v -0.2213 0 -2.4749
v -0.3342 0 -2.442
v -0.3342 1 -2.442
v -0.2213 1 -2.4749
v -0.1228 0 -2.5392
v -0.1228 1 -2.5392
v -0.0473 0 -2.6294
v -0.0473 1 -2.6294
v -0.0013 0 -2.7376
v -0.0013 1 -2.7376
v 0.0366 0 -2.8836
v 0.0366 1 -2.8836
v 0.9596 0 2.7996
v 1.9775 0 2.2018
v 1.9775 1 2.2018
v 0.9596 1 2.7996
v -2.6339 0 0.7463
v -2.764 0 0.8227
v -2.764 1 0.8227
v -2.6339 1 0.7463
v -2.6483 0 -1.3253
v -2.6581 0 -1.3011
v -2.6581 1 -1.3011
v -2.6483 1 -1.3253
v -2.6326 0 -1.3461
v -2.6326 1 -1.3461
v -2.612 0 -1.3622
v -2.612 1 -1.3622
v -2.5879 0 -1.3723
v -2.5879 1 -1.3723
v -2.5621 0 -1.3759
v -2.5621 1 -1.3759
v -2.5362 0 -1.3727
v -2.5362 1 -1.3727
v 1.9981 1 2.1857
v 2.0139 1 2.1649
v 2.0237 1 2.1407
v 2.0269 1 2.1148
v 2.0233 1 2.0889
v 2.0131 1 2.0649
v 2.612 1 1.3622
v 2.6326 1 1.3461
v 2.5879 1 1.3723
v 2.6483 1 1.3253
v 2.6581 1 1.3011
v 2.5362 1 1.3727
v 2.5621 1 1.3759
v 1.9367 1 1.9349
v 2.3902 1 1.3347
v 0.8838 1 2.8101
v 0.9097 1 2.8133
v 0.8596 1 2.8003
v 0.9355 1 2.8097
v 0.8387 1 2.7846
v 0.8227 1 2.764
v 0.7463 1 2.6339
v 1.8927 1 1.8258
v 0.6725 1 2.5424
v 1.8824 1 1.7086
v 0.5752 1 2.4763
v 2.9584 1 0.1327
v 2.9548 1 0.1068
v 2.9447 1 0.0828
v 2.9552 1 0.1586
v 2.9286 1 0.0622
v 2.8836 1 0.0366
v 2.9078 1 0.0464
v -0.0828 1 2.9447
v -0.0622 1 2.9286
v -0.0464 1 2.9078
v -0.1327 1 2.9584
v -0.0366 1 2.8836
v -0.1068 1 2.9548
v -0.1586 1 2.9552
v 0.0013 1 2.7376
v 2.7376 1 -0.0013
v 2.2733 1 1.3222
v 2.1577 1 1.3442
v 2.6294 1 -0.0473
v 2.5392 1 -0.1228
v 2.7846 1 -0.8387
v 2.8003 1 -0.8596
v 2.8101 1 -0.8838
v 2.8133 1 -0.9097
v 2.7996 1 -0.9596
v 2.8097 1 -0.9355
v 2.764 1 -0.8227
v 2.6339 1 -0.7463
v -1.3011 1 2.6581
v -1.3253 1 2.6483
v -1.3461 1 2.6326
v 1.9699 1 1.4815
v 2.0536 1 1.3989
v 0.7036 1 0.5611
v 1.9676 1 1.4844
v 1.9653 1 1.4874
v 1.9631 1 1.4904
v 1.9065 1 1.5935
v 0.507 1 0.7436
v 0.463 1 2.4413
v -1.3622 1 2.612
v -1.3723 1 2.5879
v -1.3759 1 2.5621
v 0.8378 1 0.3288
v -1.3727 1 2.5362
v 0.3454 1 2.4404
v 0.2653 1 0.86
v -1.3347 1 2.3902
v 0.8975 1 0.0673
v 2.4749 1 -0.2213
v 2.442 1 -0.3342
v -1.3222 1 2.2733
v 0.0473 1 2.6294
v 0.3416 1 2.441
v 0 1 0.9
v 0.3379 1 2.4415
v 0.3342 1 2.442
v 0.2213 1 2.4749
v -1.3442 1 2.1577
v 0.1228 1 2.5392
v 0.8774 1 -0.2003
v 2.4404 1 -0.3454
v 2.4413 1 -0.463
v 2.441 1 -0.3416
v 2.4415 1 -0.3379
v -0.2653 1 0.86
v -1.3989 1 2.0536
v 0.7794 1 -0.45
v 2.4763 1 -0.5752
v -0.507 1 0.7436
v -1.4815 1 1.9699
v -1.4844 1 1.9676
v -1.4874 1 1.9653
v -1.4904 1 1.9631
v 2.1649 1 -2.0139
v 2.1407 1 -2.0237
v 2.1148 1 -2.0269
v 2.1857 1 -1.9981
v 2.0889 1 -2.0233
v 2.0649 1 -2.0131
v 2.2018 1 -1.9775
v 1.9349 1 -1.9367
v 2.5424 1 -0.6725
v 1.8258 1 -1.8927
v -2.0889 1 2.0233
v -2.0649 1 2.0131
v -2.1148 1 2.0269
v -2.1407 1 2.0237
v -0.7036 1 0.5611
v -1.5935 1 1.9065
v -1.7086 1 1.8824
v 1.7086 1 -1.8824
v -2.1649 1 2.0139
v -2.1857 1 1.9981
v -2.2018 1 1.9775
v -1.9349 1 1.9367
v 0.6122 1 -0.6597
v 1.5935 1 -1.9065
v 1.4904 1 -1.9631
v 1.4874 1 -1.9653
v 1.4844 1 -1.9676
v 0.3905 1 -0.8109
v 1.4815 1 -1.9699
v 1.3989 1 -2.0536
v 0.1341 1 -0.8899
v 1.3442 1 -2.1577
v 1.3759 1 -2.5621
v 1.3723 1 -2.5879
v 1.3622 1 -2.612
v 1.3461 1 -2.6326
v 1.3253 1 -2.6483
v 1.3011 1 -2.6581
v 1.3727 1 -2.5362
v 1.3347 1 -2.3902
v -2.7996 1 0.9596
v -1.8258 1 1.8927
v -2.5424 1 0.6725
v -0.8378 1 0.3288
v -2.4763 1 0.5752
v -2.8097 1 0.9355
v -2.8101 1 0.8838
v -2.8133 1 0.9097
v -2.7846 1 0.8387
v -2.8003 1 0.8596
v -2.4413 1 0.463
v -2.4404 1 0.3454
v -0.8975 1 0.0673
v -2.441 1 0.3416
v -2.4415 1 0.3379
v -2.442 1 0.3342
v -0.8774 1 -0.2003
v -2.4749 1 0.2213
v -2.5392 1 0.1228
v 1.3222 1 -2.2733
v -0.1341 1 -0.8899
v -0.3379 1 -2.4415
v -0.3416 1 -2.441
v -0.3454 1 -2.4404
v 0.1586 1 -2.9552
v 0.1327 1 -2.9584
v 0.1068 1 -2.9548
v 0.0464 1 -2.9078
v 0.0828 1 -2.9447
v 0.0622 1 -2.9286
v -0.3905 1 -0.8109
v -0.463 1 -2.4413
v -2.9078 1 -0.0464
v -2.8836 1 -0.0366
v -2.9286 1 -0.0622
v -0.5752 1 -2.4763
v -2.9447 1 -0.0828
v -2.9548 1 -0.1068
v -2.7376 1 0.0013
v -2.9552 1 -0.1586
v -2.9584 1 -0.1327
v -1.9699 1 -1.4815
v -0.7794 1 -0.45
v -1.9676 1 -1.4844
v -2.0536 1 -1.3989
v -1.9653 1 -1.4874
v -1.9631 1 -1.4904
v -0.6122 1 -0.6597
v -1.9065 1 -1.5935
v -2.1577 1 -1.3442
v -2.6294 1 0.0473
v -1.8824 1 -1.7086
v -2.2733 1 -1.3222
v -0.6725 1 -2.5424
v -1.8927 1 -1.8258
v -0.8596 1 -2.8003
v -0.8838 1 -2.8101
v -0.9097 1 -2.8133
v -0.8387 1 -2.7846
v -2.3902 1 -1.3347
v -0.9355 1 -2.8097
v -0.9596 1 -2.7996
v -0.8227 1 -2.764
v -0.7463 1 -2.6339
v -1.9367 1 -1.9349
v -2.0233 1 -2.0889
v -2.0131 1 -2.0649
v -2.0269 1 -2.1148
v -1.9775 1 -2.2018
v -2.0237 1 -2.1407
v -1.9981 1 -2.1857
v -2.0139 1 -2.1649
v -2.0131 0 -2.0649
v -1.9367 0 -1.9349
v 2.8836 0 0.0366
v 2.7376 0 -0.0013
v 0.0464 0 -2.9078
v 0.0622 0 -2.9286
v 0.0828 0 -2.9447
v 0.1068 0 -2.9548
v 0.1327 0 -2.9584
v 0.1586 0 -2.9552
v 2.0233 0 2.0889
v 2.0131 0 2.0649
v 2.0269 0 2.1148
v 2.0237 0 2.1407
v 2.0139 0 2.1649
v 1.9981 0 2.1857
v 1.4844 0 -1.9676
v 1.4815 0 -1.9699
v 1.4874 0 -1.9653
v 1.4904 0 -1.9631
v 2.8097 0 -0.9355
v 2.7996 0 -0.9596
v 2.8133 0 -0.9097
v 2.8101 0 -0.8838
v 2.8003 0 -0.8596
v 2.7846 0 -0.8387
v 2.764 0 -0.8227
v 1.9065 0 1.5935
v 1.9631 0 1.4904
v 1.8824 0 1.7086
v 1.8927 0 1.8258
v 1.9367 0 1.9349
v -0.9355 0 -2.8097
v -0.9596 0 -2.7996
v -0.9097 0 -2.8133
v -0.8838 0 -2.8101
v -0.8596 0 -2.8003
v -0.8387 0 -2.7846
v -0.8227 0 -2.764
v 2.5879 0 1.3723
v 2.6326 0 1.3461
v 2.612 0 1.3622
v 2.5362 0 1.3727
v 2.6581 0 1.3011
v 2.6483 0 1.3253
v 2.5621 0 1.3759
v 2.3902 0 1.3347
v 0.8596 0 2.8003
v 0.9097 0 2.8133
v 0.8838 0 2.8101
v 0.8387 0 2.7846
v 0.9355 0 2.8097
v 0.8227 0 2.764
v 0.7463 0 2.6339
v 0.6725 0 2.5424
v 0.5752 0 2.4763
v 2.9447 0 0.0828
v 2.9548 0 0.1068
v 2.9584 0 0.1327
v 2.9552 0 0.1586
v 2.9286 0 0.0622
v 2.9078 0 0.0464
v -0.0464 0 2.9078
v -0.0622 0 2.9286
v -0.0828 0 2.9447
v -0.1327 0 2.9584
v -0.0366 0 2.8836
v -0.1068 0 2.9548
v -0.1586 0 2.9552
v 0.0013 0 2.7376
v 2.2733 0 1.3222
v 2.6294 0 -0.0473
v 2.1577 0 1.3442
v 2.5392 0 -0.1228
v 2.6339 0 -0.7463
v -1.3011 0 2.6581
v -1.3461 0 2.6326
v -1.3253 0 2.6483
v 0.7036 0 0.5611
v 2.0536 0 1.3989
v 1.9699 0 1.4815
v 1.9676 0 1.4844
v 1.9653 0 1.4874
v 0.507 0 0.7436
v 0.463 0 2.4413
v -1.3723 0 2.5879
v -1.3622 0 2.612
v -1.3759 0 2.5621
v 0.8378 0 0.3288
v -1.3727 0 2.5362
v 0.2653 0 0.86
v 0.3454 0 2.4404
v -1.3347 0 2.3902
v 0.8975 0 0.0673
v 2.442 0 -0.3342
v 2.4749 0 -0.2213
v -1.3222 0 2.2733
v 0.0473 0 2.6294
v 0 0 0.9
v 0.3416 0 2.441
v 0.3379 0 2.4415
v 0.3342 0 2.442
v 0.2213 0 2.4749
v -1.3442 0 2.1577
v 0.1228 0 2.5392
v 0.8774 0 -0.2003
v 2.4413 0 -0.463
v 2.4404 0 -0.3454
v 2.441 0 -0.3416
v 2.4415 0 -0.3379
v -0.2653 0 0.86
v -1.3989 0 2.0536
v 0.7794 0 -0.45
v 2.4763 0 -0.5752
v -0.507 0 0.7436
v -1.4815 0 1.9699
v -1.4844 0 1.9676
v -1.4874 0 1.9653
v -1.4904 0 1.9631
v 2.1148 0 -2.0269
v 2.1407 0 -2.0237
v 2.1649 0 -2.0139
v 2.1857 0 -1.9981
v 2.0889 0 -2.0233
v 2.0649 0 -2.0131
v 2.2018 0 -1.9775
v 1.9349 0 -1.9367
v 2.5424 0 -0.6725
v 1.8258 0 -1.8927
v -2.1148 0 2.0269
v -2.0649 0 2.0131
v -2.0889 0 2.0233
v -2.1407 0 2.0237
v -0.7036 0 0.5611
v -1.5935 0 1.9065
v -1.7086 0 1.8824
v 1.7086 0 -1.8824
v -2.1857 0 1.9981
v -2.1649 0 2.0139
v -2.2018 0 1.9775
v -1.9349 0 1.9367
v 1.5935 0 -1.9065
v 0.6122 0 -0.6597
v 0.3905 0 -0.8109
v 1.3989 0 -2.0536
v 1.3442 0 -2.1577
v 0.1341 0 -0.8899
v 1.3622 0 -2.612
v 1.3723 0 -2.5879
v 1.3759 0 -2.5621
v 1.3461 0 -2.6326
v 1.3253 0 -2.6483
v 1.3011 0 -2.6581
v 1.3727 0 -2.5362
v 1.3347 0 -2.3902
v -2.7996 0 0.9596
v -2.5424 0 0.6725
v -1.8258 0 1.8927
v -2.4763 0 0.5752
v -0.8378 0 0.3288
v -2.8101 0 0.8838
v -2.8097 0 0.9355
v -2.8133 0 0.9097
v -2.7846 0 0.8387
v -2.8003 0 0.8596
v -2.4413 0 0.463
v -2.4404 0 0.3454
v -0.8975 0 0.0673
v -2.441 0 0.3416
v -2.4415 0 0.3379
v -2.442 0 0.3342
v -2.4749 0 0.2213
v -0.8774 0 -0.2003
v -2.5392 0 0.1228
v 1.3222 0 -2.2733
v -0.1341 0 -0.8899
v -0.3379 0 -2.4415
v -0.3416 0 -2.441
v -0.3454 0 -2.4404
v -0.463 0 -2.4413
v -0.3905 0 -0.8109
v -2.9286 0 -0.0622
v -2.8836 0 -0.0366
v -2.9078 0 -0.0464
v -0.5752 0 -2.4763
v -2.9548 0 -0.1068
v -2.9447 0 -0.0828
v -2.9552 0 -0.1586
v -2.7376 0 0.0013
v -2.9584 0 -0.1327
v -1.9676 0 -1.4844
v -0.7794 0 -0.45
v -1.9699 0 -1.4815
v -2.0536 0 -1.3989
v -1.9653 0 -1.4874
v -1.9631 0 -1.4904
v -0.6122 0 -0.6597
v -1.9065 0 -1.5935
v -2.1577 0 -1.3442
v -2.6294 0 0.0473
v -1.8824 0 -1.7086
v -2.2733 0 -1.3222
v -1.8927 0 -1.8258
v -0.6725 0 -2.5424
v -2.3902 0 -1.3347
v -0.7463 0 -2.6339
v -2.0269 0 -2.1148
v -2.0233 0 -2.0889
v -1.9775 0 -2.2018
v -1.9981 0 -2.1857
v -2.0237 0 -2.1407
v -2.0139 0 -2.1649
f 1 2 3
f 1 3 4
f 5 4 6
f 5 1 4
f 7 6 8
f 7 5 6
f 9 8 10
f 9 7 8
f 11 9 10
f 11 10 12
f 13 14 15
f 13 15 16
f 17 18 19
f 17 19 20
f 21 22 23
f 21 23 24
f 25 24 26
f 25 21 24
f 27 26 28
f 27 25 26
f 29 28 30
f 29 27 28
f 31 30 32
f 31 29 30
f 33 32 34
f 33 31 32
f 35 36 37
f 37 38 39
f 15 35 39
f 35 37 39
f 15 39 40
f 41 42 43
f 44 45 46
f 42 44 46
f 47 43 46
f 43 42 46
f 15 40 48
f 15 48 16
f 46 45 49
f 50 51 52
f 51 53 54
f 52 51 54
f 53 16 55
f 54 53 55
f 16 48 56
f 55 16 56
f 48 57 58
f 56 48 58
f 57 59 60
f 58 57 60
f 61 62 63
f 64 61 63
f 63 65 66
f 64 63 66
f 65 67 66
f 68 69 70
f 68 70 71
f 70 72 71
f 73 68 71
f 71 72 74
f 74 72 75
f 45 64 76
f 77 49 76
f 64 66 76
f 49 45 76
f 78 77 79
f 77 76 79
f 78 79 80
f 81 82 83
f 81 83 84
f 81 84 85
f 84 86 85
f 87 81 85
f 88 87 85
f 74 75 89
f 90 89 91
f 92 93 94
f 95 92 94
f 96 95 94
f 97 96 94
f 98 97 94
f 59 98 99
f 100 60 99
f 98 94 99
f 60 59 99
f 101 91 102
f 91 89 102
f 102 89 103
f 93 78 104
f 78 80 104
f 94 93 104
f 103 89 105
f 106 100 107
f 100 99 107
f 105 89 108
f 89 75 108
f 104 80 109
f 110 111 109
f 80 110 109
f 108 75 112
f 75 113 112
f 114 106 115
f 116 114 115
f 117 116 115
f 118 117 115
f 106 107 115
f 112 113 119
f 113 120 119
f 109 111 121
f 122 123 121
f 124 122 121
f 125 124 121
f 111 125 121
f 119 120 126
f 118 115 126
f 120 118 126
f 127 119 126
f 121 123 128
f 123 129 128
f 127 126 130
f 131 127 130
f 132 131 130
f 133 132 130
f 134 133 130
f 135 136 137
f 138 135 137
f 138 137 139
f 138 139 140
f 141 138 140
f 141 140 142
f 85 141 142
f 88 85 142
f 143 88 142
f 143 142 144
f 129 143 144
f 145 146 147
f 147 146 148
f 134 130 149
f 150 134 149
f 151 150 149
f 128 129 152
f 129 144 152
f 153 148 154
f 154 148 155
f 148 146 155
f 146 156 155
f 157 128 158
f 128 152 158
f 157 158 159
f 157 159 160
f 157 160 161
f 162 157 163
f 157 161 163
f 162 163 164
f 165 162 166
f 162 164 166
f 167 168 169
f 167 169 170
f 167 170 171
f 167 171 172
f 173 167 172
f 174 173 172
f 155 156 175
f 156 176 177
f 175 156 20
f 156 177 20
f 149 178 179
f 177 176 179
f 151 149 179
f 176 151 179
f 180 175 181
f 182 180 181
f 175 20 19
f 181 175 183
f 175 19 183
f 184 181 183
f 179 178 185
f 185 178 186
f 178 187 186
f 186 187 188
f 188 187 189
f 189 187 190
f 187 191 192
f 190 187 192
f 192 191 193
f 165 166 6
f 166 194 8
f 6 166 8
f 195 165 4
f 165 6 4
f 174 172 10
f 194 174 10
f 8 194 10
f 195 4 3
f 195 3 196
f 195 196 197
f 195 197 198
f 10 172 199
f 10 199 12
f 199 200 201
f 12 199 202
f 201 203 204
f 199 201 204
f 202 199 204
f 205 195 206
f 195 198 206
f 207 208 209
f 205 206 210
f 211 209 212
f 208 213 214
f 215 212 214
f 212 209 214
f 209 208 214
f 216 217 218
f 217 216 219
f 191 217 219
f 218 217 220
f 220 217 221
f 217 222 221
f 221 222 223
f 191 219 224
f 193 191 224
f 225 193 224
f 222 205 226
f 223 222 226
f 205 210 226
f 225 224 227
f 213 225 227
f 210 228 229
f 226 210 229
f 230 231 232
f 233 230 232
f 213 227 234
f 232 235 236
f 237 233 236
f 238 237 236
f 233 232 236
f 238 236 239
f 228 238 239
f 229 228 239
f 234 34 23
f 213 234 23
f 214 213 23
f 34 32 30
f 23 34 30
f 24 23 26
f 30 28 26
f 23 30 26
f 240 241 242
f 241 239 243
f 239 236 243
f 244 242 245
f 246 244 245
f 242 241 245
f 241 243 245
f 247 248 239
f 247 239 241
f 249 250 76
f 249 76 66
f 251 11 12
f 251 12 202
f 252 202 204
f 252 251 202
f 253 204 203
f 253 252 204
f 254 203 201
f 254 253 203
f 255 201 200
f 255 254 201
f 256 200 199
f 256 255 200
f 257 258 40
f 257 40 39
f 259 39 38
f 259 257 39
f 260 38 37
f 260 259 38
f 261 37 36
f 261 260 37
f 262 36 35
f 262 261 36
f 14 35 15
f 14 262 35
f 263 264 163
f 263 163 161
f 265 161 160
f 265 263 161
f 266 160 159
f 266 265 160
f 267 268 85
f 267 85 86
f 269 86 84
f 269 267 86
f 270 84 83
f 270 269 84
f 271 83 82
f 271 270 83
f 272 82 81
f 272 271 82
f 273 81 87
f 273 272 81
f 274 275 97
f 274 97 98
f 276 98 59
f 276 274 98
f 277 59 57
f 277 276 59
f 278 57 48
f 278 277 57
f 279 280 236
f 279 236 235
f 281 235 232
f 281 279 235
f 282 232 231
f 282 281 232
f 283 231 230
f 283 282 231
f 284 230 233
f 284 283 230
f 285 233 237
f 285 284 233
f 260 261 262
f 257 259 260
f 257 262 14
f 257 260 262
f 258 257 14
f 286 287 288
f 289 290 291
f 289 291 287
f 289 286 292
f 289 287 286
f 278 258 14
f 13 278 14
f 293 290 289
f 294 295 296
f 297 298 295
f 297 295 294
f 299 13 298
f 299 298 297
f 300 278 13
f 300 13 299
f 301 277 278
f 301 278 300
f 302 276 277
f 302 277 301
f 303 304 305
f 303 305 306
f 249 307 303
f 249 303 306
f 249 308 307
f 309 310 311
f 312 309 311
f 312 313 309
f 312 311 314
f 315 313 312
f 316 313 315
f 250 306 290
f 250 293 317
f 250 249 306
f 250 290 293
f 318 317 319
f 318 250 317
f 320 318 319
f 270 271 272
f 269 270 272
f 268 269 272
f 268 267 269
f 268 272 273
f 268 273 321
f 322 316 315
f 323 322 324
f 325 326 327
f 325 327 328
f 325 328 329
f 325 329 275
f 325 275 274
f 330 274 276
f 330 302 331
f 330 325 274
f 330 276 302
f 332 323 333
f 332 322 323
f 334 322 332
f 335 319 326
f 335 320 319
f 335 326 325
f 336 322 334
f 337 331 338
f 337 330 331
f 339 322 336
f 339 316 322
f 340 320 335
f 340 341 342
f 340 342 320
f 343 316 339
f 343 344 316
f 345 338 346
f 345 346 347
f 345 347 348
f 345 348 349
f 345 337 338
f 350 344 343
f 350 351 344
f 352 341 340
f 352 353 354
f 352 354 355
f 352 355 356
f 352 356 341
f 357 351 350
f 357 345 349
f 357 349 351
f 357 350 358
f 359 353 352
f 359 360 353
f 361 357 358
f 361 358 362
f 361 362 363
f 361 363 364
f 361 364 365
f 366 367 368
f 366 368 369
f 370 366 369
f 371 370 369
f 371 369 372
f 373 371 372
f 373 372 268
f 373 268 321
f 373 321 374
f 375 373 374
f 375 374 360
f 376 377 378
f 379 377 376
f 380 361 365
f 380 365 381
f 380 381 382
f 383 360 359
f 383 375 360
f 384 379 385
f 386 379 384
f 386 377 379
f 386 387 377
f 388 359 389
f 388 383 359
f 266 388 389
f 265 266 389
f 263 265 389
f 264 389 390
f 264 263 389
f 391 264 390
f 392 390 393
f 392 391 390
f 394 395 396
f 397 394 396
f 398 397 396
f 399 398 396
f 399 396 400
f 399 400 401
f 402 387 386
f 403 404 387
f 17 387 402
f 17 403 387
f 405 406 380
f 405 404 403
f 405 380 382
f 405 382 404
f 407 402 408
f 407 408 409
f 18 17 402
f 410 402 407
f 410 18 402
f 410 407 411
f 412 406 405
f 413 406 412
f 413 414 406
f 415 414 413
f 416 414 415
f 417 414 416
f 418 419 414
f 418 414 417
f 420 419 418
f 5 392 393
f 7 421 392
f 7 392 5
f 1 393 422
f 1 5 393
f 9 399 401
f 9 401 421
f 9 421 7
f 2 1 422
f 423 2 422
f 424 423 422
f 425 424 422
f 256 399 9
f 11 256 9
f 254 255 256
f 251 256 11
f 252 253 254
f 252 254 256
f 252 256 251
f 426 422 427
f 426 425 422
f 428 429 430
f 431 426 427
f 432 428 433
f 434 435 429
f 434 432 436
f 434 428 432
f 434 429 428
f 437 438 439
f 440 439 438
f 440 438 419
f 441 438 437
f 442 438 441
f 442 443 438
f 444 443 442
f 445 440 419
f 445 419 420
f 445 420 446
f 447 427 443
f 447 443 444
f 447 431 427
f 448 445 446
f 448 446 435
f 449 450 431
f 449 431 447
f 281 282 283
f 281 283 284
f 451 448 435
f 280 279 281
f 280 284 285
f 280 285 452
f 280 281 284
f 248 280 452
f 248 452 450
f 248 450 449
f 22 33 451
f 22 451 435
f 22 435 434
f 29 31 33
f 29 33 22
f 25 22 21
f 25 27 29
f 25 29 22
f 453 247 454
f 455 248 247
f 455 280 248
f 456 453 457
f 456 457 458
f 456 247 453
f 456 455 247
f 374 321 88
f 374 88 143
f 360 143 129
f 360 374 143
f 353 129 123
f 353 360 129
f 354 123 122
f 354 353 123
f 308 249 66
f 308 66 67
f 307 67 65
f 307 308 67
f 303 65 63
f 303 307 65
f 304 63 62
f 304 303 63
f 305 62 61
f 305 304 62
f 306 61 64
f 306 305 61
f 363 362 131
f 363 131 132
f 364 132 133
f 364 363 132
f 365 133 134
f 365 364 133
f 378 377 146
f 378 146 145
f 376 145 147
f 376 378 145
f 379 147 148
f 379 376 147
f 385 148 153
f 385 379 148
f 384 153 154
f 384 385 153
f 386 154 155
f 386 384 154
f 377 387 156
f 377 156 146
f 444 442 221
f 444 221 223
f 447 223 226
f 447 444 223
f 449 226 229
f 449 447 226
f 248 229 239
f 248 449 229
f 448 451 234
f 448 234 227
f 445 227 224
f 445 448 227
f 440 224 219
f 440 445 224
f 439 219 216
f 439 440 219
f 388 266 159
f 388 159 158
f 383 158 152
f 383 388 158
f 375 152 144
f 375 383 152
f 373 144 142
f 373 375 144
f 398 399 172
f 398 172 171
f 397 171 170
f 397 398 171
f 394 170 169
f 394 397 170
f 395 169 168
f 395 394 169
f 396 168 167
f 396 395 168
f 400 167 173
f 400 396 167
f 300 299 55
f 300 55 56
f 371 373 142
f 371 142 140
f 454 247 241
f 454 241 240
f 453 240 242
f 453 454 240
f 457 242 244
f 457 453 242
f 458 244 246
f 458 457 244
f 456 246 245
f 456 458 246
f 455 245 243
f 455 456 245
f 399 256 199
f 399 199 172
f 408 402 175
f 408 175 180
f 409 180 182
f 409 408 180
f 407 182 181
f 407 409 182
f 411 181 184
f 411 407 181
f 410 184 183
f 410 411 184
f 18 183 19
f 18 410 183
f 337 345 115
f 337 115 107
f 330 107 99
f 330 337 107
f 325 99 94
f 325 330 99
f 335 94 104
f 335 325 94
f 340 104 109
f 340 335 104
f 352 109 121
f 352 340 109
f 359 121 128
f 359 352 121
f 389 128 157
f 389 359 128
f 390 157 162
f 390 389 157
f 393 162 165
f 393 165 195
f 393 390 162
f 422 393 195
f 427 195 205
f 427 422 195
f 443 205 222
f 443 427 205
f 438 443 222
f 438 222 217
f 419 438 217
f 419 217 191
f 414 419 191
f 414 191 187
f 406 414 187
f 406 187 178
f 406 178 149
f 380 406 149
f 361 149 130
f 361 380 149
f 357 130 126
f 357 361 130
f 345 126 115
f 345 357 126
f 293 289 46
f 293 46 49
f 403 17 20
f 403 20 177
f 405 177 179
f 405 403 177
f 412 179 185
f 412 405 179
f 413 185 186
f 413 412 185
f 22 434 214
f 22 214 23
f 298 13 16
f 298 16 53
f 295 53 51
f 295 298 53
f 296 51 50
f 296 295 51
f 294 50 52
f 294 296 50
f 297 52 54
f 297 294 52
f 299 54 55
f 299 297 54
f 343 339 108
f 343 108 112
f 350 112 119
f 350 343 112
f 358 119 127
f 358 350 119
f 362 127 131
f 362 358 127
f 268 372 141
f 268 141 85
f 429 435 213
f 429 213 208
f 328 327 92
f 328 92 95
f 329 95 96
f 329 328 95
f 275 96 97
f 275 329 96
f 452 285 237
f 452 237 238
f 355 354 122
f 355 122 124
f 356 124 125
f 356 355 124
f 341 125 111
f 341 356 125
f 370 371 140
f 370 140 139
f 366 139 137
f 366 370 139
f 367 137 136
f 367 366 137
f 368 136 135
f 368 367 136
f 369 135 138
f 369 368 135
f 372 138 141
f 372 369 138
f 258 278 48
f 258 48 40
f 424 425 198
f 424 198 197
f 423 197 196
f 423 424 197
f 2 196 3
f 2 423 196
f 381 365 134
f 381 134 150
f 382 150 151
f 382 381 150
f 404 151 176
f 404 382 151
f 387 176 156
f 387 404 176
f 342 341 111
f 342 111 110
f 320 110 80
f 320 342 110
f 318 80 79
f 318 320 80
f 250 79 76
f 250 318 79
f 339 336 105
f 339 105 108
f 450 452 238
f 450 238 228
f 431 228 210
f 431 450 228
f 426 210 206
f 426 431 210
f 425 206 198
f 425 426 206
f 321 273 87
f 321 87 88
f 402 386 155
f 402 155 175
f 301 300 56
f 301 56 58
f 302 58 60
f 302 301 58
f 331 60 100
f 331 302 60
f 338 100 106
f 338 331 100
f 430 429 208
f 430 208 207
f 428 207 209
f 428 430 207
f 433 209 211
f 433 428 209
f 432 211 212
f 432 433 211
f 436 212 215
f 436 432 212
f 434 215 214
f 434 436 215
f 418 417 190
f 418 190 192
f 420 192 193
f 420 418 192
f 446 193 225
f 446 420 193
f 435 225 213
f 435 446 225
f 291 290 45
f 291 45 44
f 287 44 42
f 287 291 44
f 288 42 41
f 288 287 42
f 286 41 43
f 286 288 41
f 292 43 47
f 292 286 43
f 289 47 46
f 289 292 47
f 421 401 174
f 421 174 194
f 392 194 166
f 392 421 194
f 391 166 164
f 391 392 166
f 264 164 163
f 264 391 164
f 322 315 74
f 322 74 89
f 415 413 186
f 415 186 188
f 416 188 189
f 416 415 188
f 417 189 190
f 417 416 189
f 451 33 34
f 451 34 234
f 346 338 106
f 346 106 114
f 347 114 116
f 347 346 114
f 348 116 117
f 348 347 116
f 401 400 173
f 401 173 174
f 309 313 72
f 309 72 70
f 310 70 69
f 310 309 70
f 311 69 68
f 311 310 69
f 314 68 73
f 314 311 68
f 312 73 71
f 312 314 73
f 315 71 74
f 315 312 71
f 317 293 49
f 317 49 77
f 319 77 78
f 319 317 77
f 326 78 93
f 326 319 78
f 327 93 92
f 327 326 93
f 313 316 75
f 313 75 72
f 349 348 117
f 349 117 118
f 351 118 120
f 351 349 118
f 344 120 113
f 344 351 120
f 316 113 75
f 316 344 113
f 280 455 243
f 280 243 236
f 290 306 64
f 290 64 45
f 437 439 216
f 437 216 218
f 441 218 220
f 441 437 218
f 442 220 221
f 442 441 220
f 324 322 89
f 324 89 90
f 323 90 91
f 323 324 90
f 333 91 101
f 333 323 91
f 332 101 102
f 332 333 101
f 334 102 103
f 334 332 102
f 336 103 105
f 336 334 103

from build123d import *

# Parameters (mm, degrees)
SKETCH_1_R      = 0.9
EXTRUDE_1_DEPTH = 1


with BuildPart() as part:
    # Эскиз1 → Бобышка-Вытянуть1 (new body)
    with BuildSketch(Plane(origin=(0, 0, 0), x_dir=(1, 0, 0), z_dir=(0, 1, 0))):
        with BuildLine():
            Line((-2.955209453, 0.158565738), (-2.658114772, 1.301088723))
            ThreePointArc((-2.658114772, 1.301088723), (-2.611972769, 1.36215246), (-2.536166863, 1.372703719))
            Line((-2.536166863, 1.372703719), (-2.390204654, 1.3347486))
            ThreePointArc((-2.390204654, 1.3347486), (-2.157733286, 1.344214113), (-1.969855467, 1.481452804))
            ThreePointArc((-1.969855467, 1.481452804), (-1.966473238, 1.485939425), (-1.96308079, 1.490418325))
            ThreePointArc((-1.96308079, 1.490418325), (-1.882365193, 1.708632727), (-1.936743933, 1.934852721))
            Line((-1.936743933, 1.934852721), (-2.013116479, 2.064901911))
            ThreePointArc((-2.013116479, 2.064901911), (-2.023667738, 2.140707816), (-1.977525735, 2.201771553))
            Line((-1.977525735, 2.201771553), (-0.959562321, 2.799579639))
            ThreePointArc((-0.959562321, 2.799579639), (-0.883756416, 2.810130898), (-0.822692679, 2.763988896))
            Line((-0.822692679, 2.763988896), (-0.746320133, 2.633939706))
            ThreePointArc((-0.746320133, 2.633939706), (-0.575244924, 2.476250753), (-0.345352836, 2.440443482))
            ThreePointArc((-0.345352836, 2.440443482), (-0.339788718, 2.441224406), (-0.334222834, 2.441992643))
            ThreePointArc((-0.334222834, 2.441992643), (-0.122847405, 2.539218981), (-0.001337289, 2.737632248))
            Line((-0.001337289, 2.737632248), (0.03661783, 2.883594457))
            ThreePointArc((0.03661783, 2.883594457), (0.082759833, 2.944658194), (0.158565738, 2.955209453))
            Line((0.158565738, 2.955209453), (1.301088723, 2.658114772))
            ThreePointArc((1.301088723, 2.658114772), (1.36215246, 2.611972769), (1.372703719, 2.536166863))
            Line((1.372703719, 2.536166863), (1.3347486, 2.390204654))
            ThreePointArc((1.3347486, 2.390204654), (1.344214113, 2.157733286), (1.481452804, 1.969855467))
            ThreePointArc((1.481452804, 1.969855467), (1.485939425, 1.966473238), (1.490418325, 1.96308079))
            ThreePointArc((1.490418325, 1.96308079), (1.708632727, 1.882365193), (1.934852721, 1.936743933))
            Line((1.934852721, 1.936743933), (2.064901911, 2.013116479))
            ThreePointArc((2.064901911, 2.013116479), (2.140707816, 2.023667738), (2.201771553, 1.977525735))
            Line((2.201771553, 1.977525735), (2.799579639, 0.959562321))
            ThreePointArc((2.799579639, 0.959562321), (2.810130898, 0.883756416), (2.763988896, 0.822692679))
            Line((2.763988896, 0.822692679), (2.633939706, 0.746320133))
            ThreePointArc((2.633939706, 0.746320133), (2.476250753, 0.575244924), (2.440443482, 0.345352836))
            ThreePointArc((2.440443482, 0.345352836), (2.441224406, 0.339788718), (2.441992643, 0.334222834))
            ThreePointArc((2.441992643, 0.334222834), (2.539218981, 0.122847405), (2.737632248, 0.001337289))
            Line((2.737632248, 0.001337289), (2.883594457, -0.03661783))
            ThreePointArc((2.883594457, -0.03661783), (2.944658194, -0.082759833), (2.955209453, -0.158565738))
            Line((2.955209453, -0.158565738), (2.658114772, -1.301088723))
            ThreePointArc((2.658114772, -1.301088723), (2.611972769, -1.36215246), (2.536166863, -1.372703719))
            Line((2.536166863, -1.372703719), (2.390204654, -1.3347486))
            ThreePointArc((2.390204654, -1.3347486), (2.157733286, -1.344214113), (1.969855467, -1.481452804))
            ThreePointArc((1.969855467, -1.481452804), (1.966473238, -1.485939425), (1.96308079, -1.490418325))
            ThreePointArc((1.96308079, -1.490418325), (1.882365193, -1.708632727), (1.936743933, -1.934852721))
            Line((1.936743933, -1.934852721), (2.013116479, -2.064901911))
            ThreePointArc((2.013116479, -2.064901911), (2.023667738, -2.140707816), (1.977525735, -2.201771553))
            Line((1.977525735, -2.201771553), (0.959562321, -2.799579639))
            ThreePointArc((0.959562321, -2.799579639), (0.883756416, -2.810130898), (0.822692679, -2.763988896))
            Line((0.822692679, -2.763988896), (0.746320133, -2.633939706))
            ThreePointArc((0.746320133, -2.633939706), (0.575244924, -2.476250753), (0.345352836, -2.440443482))
            ThreePointArc((0.345352836, -2.440443482), (0.339788718, -2.441224406), (0.334222834, -2.441992643))
            ThreePointArc((0.334222834, -2.441992643), (0.122847405, -2.539218981), (0.001337289, -2.737632248))
            Line((0.001337289, -2.737632248), (-0.03661783, -2.883594457))
            ThreePointArc((-0.03661783, -2.883594457), (-0.082759833, -2.944658194), (-0.158565738, -2.955209453))
            Line((-0.158565738, -2.955209453), (-1.301088723, -2.658114772))
            ThreePointArc((-1.301088723, -2.658114772), (-1.36215246, -2.611972769), (-1.372703719, -2.536166863))
            Line((-1.372703719, -2.536166863), (-1.3347486, -2.390204654))
            ThreePointArc((-1.3347486, -2.390204654), (-1.344214113, -2.157733286), (-1.481452804, -1.969855467))
            ThreePointArc((-1.481452804, -1.969855467), (-1.485939425, -1.966473238), (-1.490418325, -1.96308079))
            ThreePointArc((-1.490418325, -1.96308079), (-1.708632727, -1.882365193), (-1.934852721, -1.936743933))
            Line((-1.934852721, -1.936743933), (-2.064901911, -2.013116479))
            ThreePointArc((-2.064901911, -2.013116479), (-2.140707816, -2.023667738), (-2.201771553, -1.977525735))
            Line((-2.201771553, -1.977525735), (-2.799579639, -0.959562321))
            ThreePointArc((-2.799579639, -0.959562321), (-2.810130898, -0.883756416), (-2.763988896, -0.822692679))
            Line((-2.763988896, -0.822692679), (-2.633939706, -0.746320133))
            ThreePointArc((-2.633939706, -0.746320133), (-2.476250753, -0.575244924), (-2.440443482, -0.345352836))
            ThreePointArc((-2.440443482, -0.345352836), (-2.441224406, -0.339788718), (-2.441992643, -0.334222834))
            ThreePointArc((-2.441992643, -0.334222834), (-2.539218981, -0.122847405), (-2.737632248, -0.001337289))
            Line((-2.737632248, -0.001337289), (-2.883594457, 0.03661783))
            ThreePointArc((-2.883594457, 0.03661783), (-2.944658194, 0.082759833), (-2.955209453, 0.158565738))
        make_face()
        with Locations(Location((0, 0, 0), (0, 0, 270))):
            Circle(SKETCH_1_R, mode=Mode.SUBTRACT)
    extrude(amount=EXTRUDE_1_DEPTH)


solid = part.part
